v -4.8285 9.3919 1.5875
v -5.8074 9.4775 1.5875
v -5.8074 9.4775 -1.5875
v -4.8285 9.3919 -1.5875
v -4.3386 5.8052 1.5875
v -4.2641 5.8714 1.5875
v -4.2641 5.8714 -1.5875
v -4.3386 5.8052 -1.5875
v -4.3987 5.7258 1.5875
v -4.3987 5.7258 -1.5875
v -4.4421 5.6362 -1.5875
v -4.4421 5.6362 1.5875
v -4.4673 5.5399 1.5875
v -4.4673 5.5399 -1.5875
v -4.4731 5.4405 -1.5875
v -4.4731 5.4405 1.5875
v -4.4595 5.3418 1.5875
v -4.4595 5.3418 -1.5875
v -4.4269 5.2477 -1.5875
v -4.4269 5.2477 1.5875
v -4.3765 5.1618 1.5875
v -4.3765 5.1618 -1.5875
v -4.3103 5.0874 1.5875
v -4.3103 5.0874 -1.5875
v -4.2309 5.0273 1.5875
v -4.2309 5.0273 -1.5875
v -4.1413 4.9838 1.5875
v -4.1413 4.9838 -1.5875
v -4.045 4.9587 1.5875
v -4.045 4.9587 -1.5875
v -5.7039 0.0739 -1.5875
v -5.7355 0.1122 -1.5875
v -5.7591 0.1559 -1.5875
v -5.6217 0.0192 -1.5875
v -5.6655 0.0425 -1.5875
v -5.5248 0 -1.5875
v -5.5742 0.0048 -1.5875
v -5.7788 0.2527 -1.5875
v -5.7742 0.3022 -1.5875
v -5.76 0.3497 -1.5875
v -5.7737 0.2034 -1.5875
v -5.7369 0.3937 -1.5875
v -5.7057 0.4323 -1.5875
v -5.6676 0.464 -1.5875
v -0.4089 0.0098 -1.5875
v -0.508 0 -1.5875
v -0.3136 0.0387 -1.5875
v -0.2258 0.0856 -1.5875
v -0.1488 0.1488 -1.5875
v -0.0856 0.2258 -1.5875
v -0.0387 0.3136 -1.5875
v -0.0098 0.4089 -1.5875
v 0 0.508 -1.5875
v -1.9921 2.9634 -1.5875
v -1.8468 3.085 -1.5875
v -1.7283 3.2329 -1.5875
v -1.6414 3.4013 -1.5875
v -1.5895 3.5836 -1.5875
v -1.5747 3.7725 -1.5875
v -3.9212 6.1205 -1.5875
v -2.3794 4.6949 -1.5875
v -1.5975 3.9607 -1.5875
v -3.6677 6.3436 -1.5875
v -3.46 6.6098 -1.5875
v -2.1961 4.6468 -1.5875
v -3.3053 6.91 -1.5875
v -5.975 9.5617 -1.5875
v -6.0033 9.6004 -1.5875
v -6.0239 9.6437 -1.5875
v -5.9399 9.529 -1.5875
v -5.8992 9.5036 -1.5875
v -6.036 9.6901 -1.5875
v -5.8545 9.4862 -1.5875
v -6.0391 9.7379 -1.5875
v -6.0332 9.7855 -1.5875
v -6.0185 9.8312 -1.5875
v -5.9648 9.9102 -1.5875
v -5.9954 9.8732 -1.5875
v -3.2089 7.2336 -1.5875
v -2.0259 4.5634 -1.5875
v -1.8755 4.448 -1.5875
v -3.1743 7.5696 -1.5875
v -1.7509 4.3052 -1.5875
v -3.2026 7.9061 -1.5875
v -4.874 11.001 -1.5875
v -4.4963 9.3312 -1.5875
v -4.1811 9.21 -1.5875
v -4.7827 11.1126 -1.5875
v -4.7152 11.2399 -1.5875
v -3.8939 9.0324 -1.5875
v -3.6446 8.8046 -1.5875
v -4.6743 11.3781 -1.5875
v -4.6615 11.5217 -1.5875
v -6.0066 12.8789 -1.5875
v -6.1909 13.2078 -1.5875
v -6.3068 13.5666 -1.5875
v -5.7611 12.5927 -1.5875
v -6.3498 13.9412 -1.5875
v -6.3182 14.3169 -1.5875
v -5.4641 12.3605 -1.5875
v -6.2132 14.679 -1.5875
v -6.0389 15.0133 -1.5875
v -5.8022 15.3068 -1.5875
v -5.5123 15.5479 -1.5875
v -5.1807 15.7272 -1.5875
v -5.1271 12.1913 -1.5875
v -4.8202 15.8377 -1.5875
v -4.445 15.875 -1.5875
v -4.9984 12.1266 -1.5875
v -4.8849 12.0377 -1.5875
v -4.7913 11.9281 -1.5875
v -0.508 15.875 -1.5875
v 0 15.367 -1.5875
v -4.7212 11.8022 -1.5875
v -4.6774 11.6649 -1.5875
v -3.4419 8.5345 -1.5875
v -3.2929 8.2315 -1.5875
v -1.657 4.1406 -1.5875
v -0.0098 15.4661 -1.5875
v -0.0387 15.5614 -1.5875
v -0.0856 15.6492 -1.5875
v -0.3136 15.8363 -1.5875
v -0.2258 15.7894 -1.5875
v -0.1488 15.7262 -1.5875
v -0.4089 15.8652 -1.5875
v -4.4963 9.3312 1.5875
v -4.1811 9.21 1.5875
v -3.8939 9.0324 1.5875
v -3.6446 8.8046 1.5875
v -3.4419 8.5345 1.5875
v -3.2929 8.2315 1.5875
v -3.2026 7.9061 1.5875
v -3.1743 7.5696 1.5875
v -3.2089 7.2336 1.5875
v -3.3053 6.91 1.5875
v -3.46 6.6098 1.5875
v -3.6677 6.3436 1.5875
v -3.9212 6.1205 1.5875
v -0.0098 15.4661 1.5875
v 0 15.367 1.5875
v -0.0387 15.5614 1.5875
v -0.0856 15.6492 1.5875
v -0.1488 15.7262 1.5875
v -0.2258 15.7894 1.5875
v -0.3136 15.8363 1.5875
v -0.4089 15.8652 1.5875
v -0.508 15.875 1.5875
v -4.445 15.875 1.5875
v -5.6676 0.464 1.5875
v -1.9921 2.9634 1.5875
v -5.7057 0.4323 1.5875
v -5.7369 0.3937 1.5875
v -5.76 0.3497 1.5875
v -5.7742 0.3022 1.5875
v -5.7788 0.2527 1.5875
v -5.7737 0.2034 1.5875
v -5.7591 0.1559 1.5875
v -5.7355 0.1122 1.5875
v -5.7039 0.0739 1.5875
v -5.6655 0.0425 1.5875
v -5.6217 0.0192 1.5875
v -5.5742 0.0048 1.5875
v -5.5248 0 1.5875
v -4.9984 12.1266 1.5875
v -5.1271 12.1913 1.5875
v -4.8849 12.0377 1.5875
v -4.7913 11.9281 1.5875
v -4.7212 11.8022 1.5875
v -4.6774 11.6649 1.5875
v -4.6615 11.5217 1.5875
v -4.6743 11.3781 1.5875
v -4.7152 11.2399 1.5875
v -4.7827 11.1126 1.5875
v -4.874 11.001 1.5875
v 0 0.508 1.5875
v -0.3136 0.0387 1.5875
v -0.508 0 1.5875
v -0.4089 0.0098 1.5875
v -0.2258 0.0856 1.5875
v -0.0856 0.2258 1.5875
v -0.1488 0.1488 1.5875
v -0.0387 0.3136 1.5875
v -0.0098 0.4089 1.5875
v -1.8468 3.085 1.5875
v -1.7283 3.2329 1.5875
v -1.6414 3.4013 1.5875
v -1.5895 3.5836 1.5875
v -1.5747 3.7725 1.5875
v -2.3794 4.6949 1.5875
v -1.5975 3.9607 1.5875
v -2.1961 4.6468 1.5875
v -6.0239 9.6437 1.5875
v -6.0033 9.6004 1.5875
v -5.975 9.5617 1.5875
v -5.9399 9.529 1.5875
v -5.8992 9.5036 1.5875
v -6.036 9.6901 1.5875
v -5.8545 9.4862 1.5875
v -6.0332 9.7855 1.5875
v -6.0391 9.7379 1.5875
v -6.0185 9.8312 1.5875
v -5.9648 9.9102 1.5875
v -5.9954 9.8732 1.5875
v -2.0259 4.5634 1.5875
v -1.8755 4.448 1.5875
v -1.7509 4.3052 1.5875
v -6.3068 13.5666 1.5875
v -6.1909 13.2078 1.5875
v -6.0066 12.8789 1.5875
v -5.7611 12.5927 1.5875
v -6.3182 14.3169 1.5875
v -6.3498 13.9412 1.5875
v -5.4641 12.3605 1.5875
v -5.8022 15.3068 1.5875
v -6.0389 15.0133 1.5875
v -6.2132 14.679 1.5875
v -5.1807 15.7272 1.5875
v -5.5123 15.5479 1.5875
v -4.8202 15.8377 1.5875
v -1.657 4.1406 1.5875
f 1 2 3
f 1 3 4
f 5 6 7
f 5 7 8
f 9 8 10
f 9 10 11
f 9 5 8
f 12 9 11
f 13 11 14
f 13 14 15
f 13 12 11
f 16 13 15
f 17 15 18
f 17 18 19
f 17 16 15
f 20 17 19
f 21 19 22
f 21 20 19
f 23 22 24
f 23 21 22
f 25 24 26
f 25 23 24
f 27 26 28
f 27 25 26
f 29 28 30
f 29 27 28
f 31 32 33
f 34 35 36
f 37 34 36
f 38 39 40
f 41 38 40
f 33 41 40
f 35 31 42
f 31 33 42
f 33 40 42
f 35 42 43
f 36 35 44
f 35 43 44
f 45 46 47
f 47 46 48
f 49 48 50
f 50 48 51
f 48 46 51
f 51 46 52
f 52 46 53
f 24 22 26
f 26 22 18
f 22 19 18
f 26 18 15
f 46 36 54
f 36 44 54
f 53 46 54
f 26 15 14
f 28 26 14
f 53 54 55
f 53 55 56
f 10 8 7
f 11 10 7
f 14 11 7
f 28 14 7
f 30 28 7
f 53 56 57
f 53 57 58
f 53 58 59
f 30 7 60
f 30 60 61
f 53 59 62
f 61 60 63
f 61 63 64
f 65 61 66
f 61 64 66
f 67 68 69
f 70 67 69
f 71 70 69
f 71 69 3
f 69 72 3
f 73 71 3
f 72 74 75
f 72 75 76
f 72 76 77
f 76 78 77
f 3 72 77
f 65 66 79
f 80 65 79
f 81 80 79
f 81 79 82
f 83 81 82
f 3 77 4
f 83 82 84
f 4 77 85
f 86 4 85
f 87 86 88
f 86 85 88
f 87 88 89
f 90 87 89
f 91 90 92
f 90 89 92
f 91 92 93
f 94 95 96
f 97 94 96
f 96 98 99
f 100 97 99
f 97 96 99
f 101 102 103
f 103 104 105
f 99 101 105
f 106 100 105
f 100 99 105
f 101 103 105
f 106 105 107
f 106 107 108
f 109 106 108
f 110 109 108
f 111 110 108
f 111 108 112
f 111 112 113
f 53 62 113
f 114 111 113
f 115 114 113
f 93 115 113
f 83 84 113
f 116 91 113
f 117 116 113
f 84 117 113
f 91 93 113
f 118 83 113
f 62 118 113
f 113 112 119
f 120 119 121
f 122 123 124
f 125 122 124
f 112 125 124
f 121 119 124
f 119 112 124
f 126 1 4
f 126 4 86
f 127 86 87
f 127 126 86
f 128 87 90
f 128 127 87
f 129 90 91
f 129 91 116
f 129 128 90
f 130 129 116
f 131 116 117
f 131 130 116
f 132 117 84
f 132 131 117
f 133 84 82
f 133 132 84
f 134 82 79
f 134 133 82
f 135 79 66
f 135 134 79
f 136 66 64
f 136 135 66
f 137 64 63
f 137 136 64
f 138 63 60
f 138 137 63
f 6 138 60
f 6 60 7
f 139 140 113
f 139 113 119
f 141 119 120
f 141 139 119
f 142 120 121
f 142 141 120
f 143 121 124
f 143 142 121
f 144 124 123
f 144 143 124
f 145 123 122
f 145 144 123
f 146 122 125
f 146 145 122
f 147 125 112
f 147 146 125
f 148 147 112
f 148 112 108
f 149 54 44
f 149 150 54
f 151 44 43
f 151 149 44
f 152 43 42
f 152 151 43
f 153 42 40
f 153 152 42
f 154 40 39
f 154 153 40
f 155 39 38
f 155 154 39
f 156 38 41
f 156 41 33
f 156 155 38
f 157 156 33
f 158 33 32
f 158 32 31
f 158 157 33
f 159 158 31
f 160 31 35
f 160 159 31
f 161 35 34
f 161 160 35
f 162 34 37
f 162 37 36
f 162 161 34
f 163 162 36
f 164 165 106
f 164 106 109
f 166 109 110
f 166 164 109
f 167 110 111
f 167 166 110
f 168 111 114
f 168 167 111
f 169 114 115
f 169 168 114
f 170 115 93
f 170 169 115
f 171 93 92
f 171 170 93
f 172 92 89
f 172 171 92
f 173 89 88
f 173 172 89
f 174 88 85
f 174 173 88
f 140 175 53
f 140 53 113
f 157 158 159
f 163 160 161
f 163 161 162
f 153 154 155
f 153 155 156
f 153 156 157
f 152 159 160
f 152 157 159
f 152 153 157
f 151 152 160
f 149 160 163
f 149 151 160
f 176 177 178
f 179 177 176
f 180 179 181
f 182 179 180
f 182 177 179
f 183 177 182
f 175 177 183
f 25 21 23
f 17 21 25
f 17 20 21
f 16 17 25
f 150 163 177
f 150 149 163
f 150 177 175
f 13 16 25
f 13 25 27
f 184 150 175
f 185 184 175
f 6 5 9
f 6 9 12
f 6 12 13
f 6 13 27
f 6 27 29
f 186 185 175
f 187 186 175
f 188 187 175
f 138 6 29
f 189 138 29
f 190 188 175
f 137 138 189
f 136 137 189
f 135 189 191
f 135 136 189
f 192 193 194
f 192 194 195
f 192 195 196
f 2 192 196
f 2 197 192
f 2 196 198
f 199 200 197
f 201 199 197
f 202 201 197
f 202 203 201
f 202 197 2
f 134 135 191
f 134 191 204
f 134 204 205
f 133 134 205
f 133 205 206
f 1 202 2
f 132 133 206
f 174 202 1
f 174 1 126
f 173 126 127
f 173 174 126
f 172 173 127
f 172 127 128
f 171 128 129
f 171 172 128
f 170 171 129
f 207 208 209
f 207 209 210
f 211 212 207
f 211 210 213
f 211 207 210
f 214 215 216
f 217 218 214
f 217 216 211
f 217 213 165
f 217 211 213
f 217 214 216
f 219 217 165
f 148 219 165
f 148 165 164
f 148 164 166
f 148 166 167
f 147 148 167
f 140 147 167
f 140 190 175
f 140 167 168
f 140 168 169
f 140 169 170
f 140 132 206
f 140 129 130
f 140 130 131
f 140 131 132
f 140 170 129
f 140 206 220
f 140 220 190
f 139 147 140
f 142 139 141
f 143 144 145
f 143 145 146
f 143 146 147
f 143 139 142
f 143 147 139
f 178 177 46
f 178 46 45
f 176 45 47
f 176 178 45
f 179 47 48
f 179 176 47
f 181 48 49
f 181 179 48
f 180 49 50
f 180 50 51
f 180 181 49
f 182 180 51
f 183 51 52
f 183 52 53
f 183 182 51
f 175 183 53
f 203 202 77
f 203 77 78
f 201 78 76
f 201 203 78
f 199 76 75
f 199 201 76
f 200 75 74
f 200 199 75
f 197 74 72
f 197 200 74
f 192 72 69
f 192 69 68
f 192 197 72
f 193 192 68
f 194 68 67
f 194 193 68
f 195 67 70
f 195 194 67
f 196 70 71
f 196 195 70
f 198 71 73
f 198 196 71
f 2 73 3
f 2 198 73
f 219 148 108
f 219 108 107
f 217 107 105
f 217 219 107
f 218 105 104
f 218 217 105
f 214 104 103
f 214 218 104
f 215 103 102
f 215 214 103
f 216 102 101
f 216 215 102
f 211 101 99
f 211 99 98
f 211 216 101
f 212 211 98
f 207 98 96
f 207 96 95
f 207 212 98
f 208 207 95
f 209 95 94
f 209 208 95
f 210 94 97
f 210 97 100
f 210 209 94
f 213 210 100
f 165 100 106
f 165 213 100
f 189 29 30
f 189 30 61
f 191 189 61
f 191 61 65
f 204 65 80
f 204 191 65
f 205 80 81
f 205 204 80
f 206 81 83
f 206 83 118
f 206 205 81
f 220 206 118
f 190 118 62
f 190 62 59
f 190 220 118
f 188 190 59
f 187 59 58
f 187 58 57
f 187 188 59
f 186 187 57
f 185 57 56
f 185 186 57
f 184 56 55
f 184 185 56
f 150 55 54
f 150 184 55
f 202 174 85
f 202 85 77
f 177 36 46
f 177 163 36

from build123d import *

# Parameters (mm, degrees)
F1_DEPTH = 1.5875


with BuildPart() as f1:
    # F0 (on Top) → F1 (new body, symmetric)
    with BuildSketch(Plane.XY):
        with BuildLine():
            Line((-5.524762, 0), (-0.508, 0))
            ThreePointArc((-0.508, 0), (-0.14879, 0.14879), (0, 0.508))
            Line((0, 0.508), (0, 15.367))
            ThreePointArc((0, 15.367), (-0.14879, 15.72621), (-0.508, 15.875))
            Line((-0.508, 15.875), (-4.445, 15.875))
            ThreePointArc((-4.445, 15.875), (-6.318154, 14.316871), (-5.127144, 12.191319))
            ThreePointArc((-5.127144, 12.191319), (-4.677356, 11.664932), (-4.873952, 11.001048))
            Line((-4.873952, 11.001048), (-5.964836, 9.910164))
            ThreePointArc((-5.964836, 9.910164), (-6.023912, 9.643686), (-5.807368, 9.477526))
            Line((-5.807368, 9.477526), (-4.828483, 9.391884))
            ThreePointArc((-4.828483, 9.391884), (-3.240143, 8.070876), (-3.921246, 6.120495))
            Line((-3.921246, 6.120495), (-4.264111, 5.871389))
            ThreePointArc((-4.264111, 5.871389), (-4.45948, 5.341818), (-4.044985, 4.958663))
            Line((-4.044985, 4.958663), (-2.379395, 4.694859))
            ThreePointArc((-2.379395, 4.694859), (-1.597478, 3.960691), (-1.992111, 2.963365))
            Line((-1.992111, 2.963365), (-5.667589, 0.464039))
            ThreePointArc((-5.667589, 0.464039), (-5.767524, 0.17928), (-5.524762, 0))
        make_face()
    extrude(amount=F1_DEPTH, both=True)


solid = f1.part
